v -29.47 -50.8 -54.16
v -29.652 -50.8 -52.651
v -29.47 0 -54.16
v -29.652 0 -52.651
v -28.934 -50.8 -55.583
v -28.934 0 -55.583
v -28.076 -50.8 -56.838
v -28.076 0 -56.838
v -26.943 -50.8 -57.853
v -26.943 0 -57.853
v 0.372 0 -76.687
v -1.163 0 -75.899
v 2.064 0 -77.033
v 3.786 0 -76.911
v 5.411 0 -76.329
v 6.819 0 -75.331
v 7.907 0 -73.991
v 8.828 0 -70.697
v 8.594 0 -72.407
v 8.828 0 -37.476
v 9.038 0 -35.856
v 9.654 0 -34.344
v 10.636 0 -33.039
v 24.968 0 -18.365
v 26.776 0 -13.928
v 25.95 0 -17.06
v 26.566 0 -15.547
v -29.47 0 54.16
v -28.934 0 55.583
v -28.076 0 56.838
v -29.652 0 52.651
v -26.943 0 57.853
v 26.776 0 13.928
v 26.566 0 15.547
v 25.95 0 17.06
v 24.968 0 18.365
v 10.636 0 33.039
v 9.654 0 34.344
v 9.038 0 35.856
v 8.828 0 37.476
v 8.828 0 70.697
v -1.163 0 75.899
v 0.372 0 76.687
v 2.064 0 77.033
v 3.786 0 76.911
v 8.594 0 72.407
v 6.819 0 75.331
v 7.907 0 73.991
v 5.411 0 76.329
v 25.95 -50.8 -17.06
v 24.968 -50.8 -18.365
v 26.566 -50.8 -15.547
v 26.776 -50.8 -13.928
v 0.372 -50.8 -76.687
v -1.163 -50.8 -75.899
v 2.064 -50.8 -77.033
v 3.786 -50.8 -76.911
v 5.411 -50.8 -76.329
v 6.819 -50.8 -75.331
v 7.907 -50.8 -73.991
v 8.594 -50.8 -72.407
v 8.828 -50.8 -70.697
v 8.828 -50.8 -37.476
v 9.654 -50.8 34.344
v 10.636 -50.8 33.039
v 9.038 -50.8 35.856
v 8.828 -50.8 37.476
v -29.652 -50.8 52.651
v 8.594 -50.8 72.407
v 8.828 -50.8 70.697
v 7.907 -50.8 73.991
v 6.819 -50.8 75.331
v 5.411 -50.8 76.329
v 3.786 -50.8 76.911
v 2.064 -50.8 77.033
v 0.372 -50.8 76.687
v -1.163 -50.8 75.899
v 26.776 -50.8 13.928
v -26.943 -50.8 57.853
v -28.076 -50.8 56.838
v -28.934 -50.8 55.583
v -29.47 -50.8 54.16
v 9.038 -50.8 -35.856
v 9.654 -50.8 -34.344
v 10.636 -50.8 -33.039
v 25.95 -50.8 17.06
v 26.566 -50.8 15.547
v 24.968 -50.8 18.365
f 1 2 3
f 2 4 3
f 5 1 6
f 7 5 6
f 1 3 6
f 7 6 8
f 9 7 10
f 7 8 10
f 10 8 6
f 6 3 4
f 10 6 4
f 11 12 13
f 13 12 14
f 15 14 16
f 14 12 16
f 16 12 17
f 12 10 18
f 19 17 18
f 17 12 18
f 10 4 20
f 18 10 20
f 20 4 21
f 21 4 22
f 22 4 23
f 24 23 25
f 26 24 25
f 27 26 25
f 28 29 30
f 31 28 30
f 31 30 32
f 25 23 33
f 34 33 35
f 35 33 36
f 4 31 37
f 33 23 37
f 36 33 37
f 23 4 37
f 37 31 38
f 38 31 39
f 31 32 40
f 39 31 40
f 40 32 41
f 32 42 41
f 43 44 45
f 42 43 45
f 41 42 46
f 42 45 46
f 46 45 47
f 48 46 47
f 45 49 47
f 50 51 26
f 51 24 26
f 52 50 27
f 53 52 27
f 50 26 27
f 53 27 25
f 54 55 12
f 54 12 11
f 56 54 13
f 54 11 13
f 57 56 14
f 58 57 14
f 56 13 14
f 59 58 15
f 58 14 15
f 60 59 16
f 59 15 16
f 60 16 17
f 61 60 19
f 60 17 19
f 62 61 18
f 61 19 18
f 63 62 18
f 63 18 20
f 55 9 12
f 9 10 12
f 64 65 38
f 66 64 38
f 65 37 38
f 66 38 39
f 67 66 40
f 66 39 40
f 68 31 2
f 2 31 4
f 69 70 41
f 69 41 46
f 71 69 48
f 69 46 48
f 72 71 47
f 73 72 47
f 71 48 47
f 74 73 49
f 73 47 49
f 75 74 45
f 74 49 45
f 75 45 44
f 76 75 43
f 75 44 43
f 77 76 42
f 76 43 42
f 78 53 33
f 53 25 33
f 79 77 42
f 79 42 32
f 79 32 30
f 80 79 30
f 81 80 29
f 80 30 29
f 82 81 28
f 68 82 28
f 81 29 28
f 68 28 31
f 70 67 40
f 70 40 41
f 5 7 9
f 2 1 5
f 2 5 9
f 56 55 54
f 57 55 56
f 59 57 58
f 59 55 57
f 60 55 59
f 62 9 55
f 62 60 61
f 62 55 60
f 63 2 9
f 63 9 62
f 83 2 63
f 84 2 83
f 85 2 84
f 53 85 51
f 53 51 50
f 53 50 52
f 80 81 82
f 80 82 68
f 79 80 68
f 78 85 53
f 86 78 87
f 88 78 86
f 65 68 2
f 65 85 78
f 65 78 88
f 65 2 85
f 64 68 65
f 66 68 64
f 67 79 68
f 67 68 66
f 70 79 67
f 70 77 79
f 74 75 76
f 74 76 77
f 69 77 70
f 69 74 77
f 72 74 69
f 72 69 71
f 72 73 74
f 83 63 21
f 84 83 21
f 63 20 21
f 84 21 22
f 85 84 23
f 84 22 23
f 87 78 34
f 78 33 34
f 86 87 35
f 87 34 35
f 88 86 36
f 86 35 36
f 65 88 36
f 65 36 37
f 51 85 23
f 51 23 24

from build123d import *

# Parameters (mm, degrees)
F1_DEPTH = 25.4
F2_DEPTH = 25.4


with BuildPart() as f1:
    # F0 (on Front) → F1 (new body)
    with BuildSketch(Plane.XZ):
        with BuildLine():
            Line((-29.6519356012, 52.650562261), (-29.6519356012, 0))
            Line((-29.6519356012, 0), (-29.6519356012, -52.650562261))
            ThreePointArc((-29.6519356012, -52.650562261), (-28.9342502123, -55.5830581471), (-26.9434215471, -57.8526849149))
            Line((-26.9434215471, -57.8526849149), (-1.1631480992, -75.8988767652))
            ThreePointArc((-1.1631480992, -75.8988767652), (5.4108337328, -76.3290687224), (8.8283378467, -70.6967541113))
            Line((8.8283378467, -70.6967541113), (8.8283378467, -37.4758915701))
            ThreePointArc((8.8283378467, -37.4758915701), (9.2975107187, -35.0804015806), (10.6356991979, -33.0388955022))
            Line((10.6356991979, -33.0388955022), (24.9684960825, -18.364842139))
            ThreePointArc((24.9684960825, -18.364842139), (26.3066845617, -16.3233360606), (26.7758574337, -13.9278460711))
            Line((26.7758574337, -13.9278460711), (26.7758574337, 0))
            Line((26.7758574337, 0), (26.7758574337, 13.9278460711))
            ThreePointArc((26.7758574337, 13.9278460711), (26.3066845617, 16.3233360606), (24.9684960825, 18.364842139))
            Line((24.9684960825, 18.364842139), (10.6356991979, 33.0388955022))
            ThreePointArc((10.6356991979, 33.0388955022), (9.2975107187, 35.0804015806), (8.8283378467, 37.4758915701))
            Line((8.8283378467, 37.4758915701), (8.8283378467, 70.6967541113))
            ThreePointArc((8.8283378467, 70.6967541113), (5.4108337328, 76.3290687224), (-1.1631480992, 75.8988767652))
            Line((-1.1631480992, 75.8988767652), (-26.9434215471, 57.8526849149))
            ThreePointArc((-26.9434215471, 57.8526849149), (-28.9342502123, 55.5830581471), (-29.6519356012, 52.650562261))
        make_face()
    extrude(amount=F1_DEPTH)

    # F2 (add): a face of the model
    f2_faces = [f1.faces().sort_by_distance(p)[0] for p in [
        (-5.4722080817, -25.4, 0),
    ]]
    extrude(f2_faces, amount=F2_DEPTH)


solid = f1.part
